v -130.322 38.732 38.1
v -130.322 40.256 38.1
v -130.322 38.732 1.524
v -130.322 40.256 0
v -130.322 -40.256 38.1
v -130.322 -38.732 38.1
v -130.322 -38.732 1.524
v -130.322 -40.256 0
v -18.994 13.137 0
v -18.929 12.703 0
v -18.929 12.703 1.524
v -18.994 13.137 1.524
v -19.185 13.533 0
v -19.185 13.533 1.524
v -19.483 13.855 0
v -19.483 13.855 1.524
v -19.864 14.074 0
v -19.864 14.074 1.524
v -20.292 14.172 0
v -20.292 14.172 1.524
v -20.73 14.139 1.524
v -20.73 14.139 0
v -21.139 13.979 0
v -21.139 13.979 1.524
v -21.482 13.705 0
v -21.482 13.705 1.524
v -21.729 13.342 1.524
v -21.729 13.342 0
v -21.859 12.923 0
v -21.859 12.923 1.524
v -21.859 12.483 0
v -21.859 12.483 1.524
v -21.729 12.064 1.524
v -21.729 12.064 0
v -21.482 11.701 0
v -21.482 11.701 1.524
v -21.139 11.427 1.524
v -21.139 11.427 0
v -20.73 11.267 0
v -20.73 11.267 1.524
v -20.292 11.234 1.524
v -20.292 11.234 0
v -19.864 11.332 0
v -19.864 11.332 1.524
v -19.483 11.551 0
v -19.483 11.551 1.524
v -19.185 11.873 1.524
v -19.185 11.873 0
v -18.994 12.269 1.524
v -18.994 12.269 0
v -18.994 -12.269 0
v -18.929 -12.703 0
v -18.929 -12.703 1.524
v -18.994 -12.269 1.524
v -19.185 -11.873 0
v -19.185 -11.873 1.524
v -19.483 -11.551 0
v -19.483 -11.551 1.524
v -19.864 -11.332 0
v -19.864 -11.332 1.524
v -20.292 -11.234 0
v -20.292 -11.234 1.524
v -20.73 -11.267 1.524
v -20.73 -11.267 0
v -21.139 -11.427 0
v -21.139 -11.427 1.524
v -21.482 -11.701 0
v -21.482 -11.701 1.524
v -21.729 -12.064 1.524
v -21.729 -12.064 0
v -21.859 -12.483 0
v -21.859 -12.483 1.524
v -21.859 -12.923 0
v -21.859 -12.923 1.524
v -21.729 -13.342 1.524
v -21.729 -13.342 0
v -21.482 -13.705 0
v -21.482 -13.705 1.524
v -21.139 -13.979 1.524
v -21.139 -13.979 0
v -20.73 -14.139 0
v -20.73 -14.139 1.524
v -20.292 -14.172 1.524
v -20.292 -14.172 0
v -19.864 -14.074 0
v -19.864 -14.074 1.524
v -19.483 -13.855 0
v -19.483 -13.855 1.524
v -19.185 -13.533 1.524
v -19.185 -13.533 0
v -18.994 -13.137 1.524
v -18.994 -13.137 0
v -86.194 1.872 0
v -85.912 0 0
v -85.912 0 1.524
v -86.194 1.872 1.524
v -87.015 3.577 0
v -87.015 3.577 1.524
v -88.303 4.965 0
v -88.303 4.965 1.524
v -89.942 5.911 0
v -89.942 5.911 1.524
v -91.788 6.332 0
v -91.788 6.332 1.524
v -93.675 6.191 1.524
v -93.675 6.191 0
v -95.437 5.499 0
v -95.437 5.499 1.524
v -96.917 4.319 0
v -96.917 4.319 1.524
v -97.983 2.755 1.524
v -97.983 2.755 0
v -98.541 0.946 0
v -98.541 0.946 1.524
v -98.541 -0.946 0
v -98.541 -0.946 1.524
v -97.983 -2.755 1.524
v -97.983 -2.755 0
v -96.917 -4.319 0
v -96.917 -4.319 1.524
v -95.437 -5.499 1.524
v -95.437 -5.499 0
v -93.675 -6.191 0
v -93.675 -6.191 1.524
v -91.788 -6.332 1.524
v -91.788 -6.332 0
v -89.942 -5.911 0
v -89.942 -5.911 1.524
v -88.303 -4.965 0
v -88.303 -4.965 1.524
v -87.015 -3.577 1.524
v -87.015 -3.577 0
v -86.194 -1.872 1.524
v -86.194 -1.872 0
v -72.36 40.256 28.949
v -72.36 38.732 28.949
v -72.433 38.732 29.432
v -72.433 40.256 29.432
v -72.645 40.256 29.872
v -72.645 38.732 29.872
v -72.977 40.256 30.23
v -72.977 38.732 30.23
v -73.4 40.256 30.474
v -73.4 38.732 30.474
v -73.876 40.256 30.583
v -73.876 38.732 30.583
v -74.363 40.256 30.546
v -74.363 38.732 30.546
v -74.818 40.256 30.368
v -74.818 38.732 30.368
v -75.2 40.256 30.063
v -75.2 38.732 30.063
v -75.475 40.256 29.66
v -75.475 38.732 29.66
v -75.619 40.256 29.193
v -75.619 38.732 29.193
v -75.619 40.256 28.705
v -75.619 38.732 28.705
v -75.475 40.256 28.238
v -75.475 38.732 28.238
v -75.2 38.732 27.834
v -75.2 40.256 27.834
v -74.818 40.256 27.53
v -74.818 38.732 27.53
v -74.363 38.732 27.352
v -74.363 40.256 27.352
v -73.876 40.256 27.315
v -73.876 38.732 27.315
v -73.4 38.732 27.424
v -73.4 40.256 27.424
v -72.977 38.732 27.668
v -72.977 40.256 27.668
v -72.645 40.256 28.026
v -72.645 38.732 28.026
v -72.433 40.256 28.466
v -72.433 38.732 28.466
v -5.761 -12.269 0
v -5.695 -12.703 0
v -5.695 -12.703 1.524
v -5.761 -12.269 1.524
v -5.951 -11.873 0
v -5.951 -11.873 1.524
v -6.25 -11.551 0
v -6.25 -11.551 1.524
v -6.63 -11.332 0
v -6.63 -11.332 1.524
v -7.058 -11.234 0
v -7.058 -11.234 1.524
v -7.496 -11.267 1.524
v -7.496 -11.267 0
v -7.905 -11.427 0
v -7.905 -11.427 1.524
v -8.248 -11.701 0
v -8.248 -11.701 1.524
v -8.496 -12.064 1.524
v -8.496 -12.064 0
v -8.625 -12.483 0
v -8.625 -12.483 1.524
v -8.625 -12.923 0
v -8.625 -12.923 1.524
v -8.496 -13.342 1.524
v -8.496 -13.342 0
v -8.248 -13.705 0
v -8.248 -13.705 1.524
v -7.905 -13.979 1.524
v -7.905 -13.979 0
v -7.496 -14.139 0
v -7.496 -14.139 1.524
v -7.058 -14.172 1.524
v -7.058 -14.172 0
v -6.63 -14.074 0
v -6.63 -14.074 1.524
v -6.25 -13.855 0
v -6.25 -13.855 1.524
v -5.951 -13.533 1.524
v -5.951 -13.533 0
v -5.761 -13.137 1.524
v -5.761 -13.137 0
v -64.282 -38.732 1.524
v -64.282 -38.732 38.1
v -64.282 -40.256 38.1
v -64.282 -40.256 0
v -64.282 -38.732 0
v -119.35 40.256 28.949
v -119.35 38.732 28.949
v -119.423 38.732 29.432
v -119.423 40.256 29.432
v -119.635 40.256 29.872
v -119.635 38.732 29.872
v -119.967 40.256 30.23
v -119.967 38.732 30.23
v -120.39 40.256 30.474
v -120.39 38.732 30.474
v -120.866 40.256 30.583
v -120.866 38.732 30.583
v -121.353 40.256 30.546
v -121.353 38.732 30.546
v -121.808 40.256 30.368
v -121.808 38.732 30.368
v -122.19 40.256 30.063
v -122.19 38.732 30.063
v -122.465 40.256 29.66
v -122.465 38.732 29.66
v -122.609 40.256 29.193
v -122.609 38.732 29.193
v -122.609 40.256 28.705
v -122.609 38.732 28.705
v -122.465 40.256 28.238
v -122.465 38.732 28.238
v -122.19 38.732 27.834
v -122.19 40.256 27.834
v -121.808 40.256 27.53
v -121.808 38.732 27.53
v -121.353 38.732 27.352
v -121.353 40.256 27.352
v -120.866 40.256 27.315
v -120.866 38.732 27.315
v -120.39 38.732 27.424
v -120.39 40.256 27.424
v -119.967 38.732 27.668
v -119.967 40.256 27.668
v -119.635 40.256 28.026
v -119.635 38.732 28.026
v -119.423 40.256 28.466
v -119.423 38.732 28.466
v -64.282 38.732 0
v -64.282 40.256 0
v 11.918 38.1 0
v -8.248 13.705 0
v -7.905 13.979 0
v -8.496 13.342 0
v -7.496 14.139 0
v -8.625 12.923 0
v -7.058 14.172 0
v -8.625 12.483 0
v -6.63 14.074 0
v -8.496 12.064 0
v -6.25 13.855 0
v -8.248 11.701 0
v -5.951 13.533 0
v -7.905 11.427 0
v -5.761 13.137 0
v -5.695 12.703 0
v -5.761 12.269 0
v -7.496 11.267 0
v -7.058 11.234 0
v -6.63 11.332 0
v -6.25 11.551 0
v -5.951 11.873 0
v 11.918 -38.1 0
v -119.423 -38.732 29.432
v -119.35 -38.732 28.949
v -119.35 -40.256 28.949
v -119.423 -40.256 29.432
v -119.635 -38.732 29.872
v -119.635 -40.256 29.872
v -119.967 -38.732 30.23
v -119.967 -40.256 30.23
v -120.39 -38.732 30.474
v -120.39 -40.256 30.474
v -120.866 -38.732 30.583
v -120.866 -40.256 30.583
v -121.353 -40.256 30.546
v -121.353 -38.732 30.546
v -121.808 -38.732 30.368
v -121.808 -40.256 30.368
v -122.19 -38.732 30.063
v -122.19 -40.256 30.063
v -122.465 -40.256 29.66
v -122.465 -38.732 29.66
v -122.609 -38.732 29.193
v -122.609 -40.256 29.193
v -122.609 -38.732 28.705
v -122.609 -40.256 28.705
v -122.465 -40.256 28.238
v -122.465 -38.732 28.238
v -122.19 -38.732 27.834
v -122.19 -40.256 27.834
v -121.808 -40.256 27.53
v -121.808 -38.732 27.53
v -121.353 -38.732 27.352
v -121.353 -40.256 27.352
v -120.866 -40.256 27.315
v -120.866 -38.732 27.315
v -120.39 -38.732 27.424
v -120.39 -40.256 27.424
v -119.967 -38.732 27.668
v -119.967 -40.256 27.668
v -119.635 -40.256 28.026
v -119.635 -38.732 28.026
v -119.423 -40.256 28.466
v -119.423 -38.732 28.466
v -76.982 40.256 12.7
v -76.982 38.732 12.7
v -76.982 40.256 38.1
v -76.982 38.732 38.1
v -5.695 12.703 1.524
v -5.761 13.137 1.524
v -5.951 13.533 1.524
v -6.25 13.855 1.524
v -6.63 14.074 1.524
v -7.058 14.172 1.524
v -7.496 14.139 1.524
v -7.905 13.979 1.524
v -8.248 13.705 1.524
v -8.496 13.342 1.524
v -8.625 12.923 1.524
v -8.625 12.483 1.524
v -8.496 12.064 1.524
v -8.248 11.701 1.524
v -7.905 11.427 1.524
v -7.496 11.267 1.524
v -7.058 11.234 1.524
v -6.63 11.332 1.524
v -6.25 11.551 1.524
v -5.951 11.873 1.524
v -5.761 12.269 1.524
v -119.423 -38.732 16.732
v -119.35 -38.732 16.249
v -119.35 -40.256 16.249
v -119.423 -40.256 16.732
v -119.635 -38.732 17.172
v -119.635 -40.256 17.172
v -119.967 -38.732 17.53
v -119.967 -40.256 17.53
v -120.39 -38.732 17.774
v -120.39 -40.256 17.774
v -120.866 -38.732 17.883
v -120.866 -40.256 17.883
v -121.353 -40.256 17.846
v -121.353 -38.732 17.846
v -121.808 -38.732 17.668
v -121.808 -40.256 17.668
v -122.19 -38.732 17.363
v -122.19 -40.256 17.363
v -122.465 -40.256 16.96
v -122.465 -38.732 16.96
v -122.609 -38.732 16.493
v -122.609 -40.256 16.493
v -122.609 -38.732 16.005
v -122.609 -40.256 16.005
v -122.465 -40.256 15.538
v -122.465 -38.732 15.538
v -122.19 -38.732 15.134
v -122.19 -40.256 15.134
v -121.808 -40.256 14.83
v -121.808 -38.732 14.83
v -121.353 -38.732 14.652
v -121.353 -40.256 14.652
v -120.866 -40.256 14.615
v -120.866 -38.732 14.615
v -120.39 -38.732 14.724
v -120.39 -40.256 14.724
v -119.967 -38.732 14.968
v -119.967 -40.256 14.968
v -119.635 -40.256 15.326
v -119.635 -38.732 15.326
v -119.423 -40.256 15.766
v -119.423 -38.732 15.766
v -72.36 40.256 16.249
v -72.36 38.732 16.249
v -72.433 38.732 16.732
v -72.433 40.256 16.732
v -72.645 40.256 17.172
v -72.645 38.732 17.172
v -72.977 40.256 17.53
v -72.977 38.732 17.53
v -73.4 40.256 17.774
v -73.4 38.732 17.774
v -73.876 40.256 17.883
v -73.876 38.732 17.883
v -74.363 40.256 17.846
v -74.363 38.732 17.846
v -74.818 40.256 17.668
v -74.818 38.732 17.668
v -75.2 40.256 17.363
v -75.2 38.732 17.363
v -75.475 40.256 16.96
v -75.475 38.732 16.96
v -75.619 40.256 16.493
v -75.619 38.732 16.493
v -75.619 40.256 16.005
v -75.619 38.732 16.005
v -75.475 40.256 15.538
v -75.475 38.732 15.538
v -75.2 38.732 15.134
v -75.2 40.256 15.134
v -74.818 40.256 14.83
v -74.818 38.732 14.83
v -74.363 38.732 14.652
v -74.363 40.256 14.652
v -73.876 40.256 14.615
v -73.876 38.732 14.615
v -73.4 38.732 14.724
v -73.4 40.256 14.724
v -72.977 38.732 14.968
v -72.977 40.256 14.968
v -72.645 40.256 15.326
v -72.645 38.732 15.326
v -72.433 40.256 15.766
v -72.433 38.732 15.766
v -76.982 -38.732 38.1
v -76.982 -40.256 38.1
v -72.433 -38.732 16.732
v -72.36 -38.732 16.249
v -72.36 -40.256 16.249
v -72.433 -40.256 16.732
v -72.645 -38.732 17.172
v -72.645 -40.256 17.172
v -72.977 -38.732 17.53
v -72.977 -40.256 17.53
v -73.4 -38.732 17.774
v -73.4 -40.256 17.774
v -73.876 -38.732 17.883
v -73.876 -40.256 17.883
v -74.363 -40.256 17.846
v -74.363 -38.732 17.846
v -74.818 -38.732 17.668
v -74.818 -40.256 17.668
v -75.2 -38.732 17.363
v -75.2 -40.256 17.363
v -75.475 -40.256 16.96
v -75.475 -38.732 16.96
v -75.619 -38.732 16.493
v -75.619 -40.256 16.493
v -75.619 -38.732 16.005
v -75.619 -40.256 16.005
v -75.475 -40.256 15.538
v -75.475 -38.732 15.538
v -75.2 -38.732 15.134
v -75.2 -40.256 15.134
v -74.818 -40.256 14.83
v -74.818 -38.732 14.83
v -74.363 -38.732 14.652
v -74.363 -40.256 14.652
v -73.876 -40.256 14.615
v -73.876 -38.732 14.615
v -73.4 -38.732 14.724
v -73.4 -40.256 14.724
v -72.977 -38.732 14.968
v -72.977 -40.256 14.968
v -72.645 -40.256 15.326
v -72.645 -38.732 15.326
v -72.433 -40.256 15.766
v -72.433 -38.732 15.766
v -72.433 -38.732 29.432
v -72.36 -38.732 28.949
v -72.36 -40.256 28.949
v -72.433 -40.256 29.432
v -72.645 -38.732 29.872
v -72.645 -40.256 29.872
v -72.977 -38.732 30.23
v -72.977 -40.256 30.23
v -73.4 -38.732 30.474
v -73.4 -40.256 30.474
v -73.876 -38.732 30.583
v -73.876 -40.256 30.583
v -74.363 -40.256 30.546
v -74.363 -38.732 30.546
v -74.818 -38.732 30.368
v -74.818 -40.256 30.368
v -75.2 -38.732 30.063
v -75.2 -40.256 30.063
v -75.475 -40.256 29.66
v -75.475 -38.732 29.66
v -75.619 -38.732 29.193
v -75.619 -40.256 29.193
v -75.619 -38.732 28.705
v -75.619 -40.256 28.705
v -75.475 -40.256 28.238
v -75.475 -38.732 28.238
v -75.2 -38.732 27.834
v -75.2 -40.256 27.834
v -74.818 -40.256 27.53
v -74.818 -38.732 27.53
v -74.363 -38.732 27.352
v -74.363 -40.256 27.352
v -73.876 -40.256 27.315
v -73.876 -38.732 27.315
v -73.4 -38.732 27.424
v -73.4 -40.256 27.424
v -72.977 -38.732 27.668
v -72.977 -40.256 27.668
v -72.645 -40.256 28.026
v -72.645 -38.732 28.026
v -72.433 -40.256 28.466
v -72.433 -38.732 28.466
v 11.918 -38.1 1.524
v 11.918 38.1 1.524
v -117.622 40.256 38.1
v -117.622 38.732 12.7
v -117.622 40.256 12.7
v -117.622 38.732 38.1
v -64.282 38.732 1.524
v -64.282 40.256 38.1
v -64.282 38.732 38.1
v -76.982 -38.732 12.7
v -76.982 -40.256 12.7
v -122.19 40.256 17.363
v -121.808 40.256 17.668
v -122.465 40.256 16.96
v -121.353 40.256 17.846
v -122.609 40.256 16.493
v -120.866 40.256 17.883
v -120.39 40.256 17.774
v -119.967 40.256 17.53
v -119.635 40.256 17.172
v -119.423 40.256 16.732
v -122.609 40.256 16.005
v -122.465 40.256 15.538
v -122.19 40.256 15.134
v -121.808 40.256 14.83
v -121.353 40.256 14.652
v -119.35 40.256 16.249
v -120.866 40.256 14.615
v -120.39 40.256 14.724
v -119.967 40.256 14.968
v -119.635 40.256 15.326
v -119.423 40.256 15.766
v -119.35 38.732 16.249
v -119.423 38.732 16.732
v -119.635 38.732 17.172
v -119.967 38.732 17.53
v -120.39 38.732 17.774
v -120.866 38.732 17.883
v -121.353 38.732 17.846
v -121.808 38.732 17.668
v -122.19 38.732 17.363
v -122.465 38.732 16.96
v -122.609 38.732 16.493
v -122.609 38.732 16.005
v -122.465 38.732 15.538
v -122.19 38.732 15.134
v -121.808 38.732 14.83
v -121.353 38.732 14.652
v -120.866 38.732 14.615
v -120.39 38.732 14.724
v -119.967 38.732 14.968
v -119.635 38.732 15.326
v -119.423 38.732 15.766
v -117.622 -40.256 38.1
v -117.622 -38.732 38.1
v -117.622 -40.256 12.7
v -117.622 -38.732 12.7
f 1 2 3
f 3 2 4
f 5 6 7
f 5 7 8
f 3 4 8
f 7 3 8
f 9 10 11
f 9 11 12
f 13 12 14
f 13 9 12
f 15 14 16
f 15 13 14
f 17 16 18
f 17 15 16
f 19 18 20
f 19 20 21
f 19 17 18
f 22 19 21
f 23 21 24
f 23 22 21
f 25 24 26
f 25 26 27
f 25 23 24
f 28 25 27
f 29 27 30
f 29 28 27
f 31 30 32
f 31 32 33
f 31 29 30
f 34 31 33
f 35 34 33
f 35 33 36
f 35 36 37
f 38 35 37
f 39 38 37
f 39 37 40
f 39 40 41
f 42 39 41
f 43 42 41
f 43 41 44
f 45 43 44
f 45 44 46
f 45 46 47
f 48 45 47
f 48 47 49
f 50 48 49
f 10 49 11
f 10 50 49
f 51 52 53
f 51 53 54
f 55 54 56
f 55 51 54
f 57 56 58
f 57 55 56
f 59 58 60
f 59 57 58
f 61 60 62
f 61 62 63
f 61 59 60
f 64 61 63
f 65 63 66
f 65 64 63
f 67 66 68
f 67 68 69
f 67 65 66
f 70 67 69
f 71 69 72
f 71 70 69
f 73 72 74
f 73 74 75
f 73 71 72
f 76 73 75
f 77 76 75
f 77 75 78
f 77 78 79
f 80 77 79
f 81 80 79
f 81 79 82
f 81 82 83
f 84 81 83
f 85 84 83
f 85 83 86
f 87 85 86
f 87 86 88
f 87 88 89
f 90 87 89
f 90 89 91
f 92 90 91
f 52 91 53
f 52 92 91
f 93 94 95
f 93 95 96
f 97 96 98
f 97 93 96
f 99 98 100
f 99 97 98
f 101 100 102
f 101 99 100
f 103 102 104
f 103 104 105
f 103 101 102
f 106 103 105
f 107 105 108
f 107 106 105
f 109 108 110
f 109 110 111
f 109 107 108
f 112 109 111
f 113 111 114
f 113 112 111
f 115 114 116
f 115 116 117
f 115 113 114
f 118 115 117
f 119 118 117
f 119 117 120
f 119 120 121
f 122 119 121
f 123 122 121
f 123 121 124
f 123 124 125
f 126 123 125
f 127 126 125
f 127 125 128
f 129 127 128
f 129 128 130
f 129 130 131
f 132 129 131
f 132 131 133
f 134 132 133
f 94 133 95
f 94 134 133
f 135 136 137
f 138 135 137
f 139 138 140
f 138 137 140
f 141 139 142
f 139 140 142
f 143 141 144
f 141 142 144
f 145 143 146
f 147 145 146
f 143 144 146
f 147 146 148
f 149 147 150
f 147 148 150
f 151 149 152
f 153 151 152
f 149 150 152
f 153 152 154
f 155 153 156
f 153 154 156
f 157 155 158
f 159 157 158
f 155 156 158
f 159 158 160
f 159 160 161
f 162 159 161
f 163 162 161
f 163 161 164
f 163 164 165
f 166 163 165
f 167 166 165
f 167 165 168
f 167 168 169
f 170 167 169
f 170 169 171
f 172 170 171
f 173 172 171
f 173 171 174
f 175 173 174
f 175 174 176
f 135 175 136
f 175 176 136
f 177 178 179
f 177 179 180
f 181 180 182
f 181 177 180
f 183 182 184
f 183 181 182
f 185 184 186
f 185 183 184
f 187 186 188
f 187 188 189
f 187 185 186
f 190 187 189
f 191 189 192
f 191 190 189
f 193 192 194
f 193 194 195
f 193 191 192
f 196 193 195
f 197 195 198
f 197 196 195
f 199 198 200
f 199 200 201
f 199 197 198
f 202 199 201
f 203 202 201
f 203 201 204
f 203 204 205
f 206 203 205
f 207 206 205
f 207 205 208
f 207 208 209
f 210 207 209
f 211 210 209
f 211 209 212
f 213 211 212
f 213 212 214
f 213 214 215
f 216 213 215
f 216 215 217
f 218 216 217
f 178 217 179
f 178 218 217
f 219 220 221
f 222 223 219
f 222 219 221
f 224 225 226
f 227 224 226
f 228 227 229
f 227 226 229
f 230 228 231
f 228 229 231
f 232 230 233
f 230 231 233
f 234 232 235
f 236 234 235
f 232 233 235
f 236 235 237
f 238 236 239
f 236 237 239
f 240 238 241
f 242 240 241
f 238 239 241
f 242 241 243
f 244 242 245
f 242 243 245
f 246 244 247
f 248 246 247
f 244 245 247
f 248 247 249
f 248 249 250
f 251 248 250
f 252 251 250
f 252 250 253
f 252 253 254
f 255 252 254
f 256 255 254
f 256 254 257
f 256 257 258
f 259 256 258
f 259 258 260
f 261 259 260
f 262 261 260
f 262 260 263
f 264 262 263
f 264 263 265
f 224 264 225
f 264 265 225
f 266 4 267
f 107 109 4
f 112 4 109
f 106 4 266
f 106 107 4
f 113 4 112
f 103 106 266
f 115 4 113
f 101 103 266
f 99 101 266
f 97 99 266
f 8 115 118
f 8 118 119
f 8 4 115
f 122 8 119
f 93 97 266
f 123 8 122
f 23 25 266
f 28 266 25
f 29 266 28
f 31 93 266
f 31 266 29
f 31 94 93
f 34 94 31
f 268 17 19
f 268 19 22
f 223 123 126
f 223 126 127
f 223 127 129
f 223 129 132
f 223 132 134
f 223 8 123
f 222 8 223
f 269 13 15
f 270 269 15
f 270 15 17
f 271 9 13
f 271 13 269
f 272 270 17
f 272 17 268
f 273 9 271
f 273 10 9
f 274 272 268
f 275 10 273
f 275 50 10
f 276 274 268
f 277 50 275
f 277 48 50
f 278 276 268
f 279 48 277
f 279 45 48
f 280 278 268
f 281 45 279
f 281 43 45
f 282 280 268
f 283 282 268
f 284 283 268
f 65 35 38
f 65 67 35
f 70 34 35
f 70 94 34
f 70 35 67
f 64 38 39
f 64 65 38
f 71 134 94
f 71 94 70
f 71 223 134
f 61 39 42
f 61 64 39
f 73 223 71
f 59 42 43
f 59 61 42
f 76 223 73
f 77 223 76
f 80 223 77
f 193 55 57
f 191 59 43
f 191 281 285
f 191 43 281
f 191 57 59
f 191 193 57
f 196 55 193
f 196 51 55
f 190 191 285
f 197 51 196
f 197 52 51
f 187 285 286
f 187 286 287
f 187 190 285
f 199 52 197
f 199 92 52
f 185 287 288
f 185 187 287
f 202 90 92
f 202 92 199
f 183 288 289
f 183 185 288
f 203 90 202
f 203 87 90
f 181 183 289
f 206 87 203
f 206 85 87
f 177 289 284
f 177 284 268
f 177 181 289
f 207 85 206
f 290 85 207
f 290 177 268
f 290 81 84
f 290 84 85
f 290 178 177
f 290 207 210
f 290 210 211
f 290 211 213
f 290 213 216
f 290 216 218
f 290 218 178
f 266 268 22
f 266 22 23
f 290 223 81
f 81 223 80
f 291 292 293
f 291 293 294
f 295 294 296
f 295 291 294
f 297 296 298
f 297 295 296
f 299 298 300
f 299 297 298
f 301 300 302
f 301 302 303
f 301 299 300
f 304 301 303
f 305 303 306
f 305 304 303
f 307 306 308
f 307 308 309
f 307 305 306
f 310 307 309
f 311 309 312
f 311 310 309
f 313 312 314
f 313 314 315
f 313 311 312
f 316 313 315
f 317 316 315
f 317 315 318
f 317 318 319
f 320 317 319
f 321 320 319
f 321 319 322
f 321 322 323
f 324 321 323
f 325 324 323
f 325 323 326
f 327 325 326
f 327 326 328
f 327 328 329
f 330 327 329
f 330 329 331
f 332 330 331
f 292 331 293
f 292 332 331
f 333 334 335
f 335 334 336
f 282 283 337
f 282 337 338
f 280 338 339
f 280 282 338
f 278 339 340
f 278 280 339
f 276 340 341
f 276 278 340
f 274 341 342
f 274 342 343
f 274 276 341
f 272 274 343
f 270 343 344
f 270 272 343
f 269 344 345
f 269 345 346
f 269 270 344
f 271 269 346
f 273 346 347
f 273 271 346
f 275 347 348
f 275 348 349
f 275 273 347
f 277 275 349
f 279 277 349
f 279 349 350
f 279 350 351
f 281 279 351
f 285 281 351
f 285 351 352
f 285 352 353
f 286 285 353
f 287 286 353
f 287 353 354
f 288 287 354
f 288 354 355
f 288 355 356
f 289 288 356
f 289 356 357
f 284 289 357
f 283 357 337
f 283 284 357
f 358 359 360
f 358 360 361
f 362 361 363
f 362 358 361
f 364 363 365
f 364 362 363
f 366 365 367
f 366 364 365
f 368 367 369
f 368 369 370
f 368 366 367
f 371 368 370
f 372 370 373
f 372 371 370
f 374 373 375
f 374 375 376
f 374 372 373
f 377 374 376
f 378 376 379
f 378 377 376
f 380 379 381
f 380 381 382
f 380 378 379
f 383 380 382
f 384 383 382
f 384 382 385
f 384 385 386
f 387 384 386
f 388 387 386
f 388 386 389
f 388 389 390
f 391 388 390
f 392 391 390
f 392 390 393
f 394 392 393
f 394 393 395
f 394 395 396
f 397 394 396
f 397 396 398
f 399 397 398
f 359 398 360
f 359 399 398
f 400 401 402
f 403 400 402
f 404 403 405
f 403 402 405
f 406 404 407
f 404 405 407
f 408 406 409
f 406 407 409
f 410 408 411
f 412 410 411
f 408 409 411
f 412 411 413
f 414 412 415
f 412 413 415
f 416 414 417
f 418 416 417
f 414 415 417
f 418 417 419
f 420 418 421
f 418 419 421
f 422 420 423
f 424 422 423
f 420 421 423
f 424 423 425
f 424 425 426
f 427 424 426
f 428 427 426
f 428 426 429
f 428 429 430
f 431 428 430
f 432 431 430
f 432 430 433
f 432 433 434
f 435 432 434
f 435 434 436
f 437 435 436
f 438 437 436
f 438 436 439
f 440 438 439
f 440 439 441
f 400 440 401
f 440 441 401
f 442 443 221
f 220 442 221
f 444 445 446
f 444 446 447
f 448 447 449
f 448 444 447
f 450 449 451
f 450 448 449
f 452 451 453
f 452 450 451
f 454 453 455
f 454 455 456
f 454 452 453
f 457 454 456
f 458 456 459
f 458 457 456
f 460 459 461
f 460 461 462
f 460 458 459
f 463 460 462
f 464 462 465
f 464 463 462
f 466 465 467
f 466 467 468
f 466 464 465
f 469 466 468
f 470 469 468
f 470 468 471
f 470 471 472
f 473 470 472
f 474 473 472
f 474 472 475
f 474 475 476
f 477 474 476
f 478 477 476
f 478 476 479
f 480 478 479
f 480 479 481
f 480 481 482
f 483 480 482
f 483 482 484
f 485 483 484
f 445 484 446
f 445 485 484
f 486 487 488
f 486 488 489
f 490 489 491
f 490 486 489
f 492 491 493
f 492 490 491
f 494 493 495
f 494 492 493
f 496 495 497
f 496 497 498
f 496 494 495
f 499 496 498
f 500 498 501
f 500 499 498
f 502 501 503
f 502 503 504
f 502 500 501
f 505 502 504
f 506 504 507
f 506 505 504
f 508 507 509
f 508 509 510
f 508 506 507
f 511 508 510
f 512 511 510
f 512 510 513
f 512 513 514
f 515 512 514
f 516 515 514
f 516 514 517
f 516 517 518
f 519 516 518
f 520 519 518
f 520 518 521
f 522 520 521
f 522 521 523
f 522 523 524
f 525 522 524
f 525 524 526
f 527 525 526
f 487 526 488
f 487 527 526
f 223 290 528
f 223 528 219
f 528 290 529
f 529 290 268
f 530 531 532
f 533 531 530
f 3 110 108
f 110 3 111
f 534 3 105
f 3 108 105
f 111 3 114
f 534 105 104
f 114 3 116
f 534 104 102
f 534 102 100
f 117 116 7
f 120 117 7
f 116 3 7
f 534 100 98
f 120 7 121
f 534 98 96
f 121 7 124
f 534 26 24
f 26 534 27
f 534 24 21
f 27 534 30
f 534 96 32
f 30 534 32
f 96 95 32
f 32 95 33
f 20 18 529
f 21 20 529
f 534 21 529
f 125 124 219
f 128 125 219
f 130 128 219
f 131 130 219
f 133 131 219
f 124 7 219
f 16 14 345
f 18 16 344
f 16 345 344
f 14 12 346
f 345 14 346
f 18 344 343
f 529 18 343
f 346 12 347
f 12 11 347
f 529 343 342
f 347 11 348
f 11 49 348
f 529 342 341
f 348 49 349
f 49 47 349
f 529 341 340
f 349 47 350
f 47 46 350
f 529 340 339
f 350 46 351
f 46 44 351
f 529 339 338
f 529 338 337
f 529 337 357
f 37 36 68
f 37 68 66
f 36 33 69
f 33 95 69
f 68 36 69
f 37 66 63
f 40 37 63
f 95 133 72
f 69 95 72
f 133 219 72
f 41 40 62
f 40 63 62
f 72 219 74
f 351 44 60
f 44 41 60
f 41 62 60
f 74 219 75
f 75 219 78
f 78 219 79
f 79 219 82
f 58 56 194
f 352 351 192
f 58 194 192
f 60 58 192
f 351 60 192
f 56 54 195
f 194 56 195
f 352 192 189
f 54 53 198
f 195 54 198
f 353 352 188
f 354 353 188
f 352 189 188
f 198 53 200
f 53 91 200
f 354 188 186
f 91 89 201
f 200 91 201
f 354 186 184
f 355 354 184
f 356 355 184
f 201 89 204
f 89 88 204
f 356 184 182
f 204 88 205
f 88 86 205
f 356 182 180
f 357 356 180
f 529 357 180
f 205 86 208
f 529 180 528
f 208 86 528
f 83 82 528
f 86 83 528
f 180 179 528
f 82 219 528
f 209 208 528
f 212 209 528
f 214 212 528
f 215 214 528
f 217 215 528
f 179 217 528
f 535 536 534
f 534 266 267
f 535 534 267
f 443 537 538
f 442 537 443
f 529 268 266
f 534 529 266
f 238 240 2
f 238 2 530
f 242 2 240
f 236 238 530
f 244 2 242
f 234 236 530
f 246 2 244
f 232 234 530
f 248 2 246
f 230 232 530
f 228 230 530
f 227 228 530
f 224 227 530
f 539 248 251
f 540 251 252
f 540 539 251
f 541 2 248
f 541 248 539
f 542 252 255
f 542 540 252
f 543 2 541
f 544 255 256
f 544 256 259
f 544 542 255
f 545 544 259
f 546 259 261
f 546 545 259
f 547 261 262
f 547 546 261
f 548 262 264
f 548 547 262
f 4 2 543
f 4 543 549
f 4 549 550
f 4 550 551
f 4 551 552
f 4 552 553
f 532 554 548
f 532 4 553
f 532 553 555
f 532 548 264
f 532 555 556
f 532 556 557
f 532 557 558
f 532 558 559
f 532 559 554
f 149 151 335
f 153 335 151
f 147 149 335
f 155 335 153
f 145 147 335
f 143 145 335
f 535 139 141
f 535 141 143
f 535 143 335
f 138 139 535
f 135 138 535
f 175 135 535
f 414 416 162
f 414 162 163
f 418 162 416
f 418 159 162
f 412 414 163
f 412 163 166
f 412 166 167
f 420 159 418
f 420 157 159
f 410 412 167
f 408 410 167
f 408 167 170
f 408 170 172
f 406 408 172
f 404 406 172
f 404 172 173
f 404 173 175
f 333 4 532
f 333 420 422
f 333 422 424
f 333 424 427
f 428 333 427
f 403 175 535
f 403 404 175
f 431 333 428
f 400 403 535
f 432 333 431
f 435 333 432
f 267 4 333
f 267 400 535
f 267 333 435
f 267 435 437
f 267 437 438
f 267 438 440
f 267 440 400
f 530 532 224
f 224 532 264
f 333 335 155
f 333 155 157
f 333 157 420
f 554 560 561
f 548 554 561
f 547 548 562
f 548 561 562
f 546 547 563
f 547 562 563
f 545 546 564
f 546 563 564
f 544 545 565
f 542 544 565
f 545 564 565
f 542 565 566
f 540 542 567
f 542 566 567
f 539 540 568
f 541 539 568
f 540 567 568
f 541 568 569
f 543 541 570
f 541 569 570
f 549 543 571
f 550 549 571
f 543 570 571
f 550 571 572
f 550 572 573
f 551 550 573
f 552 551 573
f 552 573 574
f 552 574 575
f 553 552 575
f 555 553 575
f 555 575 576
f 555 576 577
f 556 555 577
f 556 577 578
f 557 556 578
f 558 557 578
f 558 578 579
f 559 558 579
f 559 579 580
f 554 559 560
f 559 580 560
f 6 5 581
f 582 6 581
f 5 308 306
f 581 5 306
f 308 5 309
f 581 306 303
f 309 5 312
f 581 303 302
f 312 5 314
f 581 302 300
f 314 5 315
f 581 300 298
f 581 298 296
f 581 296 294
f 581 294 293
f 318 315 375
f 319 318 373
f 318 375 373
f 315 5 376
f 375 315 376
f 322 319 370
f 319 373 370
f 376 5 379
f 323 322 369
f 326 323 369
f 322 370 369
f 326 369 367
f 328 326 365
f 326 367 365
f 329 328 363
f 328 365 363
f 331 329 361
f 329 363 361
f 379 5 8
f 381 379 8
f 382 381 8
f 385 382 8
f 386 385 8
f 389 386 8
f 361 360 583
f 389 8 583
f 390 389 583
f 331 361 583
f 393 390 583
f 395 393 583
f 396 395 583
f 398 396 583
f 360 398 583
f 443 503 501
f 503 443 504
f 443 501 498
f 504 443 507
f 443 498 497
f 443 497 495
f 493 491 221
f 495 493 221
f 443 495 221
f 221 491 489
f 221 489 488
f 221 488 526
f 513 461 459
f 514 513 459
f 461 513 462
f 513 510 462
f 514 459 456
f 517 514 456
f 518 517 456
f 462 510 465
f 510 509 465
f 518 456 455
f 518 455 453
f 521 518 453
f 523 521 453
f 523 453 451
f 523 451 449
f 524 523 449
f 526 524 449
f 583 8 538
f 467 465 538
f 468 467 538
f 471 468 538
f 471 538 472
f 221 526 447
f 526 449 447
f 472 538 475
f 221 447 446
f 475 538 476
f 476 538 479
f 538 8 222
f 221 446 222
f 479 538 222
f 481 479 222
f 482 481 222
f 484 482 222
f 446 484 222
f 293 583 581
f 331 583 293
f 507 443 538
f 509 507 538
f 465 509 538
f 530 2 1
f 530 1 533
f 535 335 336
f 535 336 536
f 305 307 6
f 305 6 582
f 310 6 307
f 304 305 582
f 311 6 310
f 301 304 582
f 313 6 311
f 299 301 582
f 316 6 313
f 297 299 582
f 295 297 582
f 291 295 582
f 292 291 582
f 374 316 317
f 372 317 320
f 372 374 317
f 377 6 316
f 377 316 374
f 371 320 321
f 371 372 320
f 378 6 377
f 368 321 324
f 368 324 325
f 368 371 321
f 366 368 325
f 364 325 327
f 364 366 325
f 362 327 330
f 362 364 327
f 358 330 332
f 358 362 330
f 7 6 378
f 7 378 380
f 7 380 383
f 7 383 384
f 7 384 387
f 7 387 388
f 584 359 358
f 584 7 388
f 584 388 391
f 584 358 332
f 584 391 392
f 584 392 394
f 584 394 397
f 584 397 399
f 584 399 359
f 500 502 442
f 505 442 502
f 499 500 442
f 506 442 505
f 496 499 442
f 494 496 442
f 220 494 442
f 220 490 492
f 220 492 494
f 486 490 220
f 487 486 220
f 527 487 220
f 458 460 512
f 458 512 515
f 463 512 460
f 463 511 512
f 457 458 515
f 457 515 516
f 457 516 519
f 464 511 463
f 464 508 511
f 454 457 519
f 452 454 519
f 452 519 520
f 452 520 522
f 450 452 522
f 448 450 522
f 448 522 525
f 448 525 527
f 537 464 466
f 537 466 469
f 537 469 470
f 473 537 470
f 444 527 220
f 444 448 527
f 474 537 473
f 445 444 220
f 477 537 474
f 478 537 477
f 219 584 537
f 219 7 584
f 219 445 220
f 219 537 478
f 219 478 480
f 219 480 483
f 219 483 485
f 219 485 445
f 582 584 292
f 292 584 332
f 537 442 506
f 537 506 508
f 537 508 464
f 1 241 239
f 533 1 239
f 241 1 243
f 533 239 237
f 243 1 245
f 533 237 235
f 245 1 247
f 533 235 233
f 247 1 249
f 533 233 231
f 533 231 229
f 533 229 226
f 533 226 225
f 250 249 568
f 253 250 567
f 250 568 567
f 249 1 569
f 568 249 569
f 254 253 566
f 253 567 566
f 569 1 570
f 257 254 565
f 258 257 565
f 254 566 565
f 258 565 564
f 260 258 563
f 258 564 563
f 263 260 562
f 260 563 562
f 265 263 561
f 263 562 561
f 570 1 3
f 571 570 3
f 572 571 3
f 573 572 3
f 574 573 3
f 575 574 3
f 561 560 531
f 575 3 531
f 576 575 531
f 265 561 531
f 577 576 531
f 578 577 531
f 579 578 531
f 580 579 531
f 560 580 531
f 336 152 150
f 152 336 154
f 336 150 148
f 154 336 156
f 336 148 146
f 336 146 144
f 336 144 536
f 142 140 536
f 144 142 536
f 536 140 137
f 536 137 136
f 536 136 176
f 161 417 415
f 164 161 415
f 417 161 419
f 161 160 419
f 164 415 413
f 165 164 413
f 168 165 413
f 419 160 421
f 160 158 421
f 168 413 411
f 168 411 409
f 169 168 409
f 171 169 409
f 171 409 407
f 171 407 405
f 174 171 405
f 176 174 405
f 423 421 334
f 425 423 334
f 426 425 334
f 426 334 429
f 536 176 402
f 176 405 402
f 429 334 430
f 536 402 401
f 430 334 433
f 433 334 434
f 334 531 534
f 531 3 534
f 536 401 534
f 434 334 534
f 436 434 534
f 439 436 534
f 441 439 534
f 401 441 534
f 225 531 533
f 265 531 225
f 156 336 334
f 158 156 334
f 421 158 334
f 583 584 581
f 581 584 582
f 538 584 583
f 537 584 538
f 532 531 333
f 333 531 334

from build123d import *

# Parameters (mm, degrees)
F0_R     = 6.35
F0_R_2   = 1.4732
F1_DEPTH = 1.524
F2_W     = 66.04
F2_H     = 1.524
F3_DEPTH = 38.1
F4_W     = 40.64
F4_H     = 25.4
F4_R     = 1.6383
F5_DEPTH = 1.524


with BuildPart() as f1:
    # F0 (on Top) → F1 (new body)
    with BuildSketch(Plane.XY):
        Polygon((11.91761, 0), (11.91761, 38.1), (-64.28239, 38.732044), (-130.32239, 38.732044), (-130.32239, 0), (-130.32239, -37.783978), (11.91761, -38.1), align=None)
        with Locations((-92.262112, 0)):
            Circle(F0_R, mode=Mode.SUBTRACT)
        with Locations((-20.401943, -12.703063)):
            Circle(F0_R_2, mode=Mode.SUBTRACT)
        with Locations((-7.168442, -12.703063)):
            Circle(F0_R_2, mode=Mode.SUBTRACT)
        with Locations((-20.401943, 12.703063)):
            Circle(F0_R_2, mode=Mode.SUBTRACT)
        with Locations((-7.168442, 12.703063)):
            Circle(F0_R_2, mode=Mode.SUBTRACT)
        Polygon((-64.28239, -38.1), (11.91761, -38.1), (-130.32239, -37.783978), align=None)
    extrude(amount=F1_DEPTH)

    # F2 (on Top) → F3 (join)
    with BuildSketch(Plane.XY):
        with Locations((-97.30239, 39.494044)):
            Rectangle(F2_W, F2_H)
    extrude(amount=F3_DEPTH)

    # F4 (on face) → F5 (cut)
    with BuildSketch(Plane.XZ.offset(-38.732044)):
        with Locations((-97.30239, 25.4)):
            Rectangle(F4_W, F4_H)
        with Locations((-120.988675, 28.948788)):
            Circle(F4_R)
        with Locations((-120.988675, 16.248788)):
            Circle(F4_R)
        with Locations((-73.998675, 16.248788)):
            Circle(F4_R)
        with Locations((-73.998675, 28.948788)):
            Circle(F4_R)
    extrude(amount=-F5_DEPTH, mode=Mode.SUBTRACT)

    # F6: F1 across plane


with BuildPart() as f1_1:
    add(f1.part)
    add(f1.part.mirror(Plane.XZ))


solid = f1_1.part
